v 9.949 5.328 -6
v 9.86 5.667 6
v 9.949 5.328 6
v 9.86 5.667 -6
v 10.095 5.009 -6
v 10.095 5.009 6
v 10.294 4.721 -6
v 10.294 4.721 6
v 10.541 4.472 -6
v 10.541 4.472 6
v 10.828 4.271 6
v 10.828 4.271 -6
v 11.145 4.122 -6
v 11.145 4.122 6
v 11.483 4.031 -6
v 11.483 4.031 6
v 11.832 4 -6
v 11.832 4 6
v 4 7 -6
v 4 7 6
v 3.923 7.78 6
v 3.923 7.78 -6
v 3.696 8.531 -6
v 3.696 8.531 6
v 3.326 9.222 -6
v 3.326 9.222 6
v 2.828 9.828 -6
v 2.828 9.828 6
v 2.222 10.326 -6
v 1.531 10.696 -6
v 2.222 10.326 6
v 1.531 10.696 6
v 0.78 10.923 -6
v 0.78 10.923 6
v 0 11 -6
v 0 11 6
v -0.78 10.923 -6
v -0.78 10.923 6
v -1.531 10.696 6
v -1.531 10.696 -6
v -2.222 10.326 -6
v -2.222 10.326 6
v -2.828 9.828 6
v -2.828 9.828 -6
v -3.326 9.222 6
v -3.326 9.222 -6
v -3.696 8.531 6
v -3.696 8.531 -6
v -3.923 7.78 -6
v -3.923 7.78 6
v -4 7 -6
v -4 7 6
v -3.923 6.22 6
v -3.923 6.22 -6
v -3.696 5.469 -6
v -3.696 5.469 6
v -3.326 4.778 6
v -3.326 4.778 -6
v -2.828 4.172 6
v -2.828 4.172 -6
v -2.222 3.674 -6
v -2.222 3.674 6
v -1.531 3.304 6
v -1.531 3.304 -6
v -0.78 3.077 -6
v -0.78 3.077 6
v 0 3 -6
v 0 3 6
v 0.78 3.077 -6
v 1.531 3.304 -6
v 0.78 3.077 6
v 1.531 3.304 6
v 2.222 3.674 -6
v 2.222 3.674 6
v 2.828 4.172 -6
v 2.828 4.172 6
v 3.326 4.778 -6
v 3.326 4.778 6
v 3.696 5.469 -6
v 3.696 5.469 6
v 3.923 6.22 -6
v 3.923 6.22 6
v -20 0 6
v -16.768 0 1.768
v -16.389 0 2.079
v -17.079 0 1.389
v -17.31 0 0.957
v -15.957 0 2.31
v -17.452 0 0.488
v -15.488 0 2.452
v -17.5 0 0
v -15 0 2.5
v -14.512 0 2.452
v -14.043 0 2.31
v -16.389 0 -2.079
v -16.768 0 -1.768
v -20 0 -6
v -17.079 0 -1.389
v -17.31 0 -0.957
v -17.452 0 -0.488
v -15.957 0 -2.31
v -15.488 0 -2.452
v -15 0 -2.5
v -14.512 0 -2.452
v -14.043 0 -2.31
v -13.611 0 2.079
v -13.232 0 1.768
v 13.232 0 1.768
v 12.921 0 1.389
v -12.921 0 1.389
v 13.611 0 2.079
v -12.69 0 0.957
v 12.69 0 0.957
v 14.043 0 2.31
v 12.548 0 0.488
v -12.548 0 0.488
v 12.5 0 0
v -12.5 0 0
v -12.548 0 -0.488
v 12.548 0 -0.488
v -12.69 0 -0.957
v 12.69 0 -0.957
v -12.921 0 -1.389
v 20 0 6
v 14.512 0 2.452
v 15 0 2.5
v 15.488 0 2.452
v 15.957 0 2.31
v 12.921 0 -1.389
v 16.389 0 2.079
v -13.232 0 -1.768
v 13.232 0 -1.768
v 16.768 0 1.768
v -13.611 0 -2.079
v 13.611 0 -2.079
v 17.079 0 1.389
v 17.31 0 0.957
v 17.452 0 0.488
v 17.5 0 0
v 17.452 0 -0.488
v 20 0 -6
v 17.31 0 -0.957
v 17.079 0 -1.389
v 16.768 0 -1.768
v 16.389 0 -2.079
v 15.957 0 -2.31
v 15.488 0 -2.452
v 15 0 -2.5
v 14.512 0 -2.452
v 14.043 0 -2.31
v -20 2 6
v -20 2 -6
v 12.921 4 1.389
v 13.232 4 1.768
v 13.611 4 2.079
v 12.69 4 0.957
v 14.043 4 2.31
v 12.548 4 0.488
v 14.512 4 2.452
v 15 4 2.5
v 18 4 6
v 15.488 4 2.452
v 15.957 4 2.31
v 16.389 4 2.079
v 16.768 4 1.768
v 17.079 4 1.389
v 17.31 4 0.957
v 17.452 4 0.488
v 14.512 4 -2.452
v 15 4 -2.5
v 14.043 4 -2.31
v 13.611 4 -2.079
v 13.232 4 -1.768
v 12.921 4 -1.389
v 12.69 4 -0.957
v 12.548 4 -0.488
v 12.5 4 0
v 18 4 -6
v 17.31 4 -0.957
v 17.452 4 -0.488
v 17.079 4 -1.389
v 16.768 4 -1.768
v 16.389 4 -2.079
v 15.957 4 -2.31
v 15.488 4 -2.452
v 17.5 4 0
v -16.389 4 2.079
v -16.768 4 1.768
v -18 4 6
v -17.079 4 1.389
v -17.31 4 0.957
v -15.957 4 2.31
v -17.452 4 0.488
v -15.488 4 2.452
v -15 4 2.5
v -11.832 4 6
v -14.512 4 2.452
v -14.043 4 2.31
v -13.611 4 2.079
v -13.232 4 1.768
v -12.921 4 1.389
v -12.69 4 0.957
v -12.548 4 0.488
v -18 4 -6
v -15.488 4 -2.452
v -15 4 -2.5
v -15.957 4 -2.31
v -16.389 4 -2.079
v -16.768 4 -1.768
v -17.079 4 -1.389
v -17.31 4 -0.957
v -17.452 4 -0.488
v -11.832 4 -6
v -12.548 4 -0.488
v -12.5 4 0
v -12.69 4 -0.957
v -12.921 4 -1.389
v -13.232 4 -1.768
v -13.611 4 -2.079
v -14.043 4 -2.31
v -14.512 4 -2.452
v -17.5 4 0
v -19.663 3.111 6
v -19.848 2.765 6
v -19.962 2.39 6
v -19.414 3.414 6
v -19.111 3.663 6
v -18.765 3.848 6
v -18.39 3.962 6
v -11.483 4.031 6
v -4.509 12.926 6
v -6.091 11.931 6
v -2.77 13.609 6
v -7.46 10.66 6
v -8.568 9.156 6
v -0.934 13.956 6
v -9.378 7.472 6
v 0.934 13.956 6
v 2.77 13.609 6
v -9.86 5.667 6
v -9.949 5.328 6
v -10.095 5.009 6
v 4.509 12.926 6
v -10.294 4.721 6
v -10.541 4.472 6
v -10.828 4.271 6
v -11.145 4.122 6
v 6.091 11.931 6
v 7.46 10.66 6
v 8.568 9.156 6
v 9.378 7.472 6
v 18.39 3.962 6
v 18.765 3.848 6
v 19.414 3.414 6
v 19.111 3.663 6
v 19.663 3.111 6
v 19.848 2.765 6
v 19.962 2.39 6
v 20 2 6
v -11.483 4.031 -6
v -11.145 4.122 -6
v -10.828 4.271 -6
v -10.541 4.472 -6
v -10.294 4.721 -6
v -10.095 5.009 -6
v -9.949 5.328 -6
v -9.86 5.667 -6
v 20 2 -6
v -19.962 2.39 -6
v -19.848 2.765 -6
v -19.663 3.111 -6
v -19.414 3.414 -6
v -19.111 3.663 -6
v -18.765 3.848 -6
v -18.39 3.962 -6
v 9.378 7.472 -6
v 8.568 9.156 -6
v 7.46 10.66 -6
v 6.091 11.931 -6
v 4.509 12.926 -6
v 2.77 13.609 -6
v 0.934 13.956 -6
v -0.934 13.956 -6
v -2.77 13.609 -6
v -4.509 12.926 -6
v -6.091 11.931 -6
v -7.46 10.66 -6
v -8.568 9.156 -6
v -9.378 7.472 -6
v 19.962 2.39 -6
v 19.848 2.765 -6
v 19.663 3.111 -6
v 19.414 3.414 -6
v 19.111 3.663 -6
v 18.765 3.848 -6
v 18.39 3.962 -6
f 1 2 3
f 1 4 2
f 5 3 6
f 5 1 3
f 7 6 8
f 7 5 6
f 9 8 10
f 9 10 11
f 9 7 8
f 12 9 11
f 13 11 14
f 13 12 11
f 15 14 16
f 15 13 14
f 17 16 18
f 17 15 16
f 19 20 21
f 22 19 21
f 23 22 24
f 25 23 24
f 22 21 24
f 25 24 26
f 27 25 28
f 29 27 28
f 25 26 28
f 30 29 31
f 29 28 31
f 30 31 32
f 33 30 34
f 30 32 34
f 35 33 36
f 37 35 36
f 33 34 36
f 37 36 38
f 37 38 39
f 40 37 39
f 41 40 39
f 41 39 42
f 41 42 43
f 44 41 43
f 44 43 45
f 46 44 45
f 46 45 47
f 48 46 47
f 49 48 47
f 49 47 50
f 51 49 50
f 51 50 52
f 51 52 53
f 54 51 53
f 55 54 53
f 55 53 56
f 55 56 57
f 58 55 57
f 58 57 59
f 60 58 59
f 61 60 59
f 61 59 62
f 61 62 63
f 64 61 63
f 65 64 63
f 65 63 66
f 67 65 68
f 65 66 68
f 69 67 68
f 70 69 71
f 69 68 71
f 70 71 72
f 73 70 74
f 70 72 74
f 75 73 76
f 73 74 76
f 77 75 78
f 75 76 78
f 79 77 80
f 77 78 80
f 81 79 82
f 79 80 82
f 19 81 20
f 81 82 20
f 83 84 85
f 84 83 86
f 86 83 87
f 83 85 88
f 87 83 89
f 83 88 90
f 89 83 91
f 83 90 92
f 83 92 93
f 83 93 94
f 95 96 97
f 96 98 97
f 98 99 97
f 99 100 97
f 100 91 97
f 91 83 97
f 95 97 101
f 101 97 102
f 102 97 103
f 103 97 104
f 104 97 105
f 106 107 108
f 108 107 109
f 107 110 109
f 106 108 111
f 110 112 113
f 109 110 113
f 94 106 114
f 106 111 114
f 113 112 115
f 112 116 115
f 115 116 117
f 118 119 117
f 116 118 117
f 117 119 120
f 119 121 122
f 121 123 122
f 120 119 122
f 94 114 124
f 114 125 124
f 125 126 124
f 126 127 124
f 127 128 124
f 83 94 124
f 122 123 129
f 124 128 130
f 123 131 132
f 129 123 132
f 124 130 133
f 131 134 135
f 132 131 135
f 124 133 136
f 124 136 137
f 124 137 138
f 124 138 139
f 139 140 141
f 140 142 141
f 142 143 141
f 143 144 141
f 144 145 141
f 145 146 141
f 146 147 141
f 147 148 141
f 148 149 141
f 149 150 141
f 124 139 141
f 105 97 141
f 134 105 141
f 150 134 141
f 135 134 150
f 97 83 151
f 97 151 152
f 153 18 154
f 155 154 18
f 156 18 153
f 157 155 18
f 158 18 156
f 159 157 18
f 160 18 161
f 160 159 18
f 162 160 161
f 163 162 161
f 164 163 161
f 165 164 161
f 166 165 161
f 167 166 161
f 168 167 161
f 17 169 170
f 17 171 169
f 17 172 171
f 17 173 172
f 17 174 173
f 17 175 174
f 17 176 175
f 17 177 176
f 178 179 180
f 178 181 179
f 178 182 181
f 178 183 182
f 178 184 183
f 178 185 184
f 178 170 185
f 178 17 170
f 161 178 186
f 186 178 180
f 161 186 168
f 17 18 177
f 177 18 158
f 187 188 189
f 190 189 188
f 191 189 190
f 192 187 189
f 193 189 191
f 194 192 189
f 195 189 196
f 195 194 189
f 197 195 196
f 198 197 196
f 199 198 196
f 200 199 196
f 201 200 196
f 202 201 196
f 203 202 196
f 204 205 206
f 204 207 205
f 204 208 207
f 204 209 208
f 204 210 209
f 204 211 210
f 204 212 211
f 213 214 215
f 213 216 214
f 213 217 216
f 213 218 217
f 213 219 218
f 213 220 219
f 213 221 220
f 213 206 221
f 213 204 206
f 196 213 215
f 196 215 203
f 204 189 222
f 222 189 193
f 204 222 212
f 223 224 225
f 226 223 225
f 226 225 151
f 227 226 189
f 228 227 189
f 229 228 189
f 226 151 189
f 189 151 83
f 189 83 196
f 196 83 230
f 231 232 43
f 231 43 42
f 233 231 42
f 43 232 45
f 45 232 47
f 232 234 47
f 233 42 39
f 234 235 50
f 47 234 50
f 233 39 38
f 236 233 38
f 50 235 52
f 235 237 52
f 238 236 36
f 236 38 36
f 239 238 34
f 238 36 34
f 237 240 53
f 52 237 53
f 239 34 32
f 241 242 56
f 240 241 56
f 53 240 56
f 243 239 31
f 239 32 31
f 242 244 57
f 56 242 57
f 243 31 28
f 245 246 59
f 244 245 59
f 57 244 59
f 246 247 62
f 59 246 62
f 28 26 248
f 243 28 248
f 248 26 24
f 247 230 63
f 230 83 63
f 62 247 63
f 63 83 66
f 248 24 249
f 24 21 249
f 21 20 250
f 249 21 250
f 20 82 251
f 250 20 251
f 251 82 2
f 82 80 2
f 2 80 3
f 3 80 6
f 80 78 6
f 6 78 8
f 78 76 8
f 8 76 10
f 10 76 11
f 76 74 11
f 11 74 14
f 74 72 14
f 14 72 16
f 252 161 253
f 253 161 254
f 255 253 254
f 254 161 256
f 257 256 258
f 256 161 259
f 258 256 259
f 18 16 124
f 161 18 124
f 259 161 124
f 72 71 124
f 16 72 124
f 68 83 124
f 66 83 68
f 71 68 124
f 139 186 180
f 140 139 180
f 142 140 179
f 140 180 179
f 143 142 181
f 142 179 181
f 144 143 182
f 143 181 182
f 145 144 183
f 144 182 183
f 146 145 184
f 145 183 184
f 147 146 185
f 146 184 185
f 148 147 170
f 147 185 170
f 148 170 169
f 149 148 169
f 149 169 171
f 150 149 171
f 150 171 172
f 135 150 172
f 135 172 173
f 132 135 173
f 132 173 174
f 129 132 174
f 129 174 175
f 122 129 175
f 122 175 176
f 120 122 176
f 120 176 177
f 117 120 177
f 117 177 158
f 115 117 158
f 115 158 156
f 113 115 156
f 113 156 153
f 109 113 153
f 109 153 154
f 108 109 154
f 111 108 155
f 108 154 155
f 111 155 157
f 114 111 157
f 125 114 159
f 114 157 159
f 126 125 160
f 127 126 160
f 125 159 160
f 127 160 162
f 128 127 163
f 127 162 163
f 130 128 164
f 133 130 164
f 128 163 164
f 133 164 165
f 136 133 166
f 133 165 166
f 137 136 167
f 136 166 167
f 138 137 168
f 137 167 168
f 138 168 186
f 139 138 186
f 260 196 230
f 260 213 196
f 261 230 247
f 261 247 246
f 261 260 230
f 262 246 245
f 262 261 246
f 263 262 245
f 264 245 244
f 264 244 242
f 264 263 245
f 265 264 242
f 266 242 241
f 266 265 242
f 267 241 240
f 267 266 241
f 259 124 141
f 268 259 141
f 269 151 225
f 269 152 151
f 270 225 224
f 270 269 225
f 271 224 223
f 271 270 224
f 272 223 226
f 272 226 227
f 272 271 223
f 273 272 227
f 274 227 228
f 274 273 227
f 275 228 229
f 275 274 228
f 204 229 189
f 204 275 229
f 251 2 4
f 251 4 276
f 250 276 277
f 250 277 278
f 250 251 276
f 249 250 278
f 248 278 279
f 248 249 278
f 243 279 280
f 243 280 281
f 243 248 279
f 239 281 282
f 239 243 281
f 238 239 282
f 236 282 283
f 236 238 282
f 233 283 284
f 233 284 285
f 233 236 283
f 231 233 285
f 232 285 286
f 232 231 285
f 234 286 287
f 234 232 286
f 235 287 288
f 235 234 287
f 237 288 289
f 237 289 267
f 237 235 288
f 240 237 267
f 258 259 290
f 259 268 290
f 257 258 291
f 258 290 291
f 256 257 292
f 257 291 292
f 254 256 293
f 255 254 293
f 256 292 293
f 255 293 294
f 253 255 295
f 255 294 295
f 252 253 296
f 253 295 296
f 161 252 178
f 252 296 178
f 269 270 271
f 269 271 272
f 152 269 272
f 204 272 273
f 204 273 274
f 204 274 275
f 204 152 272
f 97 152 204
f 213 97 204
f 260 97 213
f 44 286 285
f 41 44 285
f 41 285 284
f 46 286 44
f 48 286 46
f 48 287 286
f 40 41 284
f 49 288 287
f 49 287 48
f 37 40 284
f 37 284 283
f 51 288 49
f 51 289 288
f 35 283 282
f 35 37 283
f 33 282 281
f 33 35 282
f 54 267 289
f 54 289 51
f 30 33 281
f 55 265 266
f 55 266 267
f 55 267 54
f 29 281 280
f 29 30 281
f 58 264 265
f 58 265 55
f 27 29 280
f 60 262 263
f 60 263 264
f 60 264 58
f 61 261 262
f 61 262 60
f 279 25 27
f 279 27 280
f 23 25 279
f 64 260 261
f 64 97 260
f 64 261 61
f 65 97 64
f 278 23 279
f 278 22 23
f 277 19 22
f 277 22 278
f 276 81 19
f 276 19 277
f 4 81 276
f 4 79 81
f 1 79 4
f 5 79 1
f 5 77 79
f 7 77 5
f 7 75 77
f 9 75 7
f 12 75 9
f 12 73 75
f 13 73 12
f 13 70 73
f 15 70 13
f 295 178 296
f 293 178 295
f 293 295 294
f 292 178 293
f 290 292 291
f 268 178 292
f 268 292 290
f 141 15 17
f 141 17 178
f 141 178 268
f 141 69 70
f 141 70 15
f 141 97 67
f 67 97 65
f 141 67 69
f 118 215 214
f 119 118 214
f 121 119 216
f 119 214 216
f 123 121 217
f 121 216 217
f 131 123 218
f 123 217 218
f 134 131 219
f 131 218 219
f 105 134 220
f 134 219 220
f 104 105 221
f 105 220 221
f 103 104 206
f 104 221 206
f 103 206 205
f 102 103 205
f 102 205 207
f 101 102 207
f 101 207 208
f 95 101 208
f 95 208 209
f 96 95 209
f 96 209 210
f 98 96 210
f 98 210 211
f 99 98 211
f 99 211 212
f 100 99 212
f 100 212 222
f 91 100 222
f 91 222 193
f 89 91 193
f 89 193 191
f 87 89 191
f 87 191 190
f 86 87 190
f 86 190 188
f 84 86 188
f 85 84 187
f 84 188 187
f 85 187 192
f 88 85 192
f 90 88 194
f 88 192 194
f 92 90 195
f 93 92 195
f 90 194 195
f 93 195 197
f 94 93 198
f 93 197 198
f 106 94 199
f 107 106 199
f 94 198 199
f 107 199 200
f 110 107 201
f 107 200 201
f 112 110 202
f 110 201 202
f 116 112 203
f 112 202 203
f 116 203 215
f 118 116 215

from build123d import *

# Parameters (mm, degrees)
SKETCH1_W           = 40
SKETCH1_H           = 12
BOSS_EXTRUDE1_DEPTH = 4
BOSS_EXTRUDE2_DEPTH = 12
SKETCH3_R           = 4
CUT_EXTRUDE1_DEPTH  = 13
SKETCH4_R           = 2.5
CUT_EXTRUDE2_DEPTH  = 5
FILLET1_R           = 2


with BuildPart() as part:
    # Sketch1 → Boss-Extrude1 (new body)
    with BuildSketch(Plane(origin=(0, 0, 0), x_dir=(1, 0, 0), z_dir=(0, 1, 0))):
        Rectangle(SKETCH1_W, SKETCH1_H)
    extrude(amount=BOSS_EXTRUDE1_DEPTH)

    # Sketch2 → Boss-Extrude2 (add)
    with BuildSketch(Plane.XY.offset(6)):
        with BuildLine():
            Line((20, 4), (10, 4))
            ThreePointArc((10, 4), (0, 14), (-10, 4))
            Line((-10, 4), (-20, 4))
            Line((-20, 4), (-20, 0))
            Line((-20, 0), (20, 0))
            Line((20, 0), (20, 4))
        make_face()
    extrude(amount=-BOSS_EXTRUDE2_DEPTH)

    # Sketch3 → Cut-Extrude1 (cut, through all)
    with BuildSketch(Plane.XY.offset(6)):
        with Locations((0, 7)):
            Circle(SKETCH3_R)
    extrude(amount=-CUT_EXTRUDE1_DEPTH, mode=Mode.SUBTRACT)

    # Sketch4 → Cut-Extrude2 (cut, through all)
    with BuildSketch(Plane(origin=(0, 4, 0), x_dir=(1, 0, 0), z_dir=(0, 1, 0))):
        with Locations((-15, 0)):
            Circle(SKETCH4_R)
        with Locations((15, 0)):
            Circle(SKETCH4_R)
    extrude(amount=-CUT_EXTRUDE2_DEPTH, mode=Mode.SUBTRACT)

    # Fillet1
    fillet1_edges = [part.edges().sort_by_distance(p)[0] for p in [
        (-20, 4, 0),
        (-10, 4, 0),
        (10, 4, 0),
        (20, 4, 0),
    ]]
    fillet(fillet1_edges, radius=FILLET1_R)


solid = part.part
